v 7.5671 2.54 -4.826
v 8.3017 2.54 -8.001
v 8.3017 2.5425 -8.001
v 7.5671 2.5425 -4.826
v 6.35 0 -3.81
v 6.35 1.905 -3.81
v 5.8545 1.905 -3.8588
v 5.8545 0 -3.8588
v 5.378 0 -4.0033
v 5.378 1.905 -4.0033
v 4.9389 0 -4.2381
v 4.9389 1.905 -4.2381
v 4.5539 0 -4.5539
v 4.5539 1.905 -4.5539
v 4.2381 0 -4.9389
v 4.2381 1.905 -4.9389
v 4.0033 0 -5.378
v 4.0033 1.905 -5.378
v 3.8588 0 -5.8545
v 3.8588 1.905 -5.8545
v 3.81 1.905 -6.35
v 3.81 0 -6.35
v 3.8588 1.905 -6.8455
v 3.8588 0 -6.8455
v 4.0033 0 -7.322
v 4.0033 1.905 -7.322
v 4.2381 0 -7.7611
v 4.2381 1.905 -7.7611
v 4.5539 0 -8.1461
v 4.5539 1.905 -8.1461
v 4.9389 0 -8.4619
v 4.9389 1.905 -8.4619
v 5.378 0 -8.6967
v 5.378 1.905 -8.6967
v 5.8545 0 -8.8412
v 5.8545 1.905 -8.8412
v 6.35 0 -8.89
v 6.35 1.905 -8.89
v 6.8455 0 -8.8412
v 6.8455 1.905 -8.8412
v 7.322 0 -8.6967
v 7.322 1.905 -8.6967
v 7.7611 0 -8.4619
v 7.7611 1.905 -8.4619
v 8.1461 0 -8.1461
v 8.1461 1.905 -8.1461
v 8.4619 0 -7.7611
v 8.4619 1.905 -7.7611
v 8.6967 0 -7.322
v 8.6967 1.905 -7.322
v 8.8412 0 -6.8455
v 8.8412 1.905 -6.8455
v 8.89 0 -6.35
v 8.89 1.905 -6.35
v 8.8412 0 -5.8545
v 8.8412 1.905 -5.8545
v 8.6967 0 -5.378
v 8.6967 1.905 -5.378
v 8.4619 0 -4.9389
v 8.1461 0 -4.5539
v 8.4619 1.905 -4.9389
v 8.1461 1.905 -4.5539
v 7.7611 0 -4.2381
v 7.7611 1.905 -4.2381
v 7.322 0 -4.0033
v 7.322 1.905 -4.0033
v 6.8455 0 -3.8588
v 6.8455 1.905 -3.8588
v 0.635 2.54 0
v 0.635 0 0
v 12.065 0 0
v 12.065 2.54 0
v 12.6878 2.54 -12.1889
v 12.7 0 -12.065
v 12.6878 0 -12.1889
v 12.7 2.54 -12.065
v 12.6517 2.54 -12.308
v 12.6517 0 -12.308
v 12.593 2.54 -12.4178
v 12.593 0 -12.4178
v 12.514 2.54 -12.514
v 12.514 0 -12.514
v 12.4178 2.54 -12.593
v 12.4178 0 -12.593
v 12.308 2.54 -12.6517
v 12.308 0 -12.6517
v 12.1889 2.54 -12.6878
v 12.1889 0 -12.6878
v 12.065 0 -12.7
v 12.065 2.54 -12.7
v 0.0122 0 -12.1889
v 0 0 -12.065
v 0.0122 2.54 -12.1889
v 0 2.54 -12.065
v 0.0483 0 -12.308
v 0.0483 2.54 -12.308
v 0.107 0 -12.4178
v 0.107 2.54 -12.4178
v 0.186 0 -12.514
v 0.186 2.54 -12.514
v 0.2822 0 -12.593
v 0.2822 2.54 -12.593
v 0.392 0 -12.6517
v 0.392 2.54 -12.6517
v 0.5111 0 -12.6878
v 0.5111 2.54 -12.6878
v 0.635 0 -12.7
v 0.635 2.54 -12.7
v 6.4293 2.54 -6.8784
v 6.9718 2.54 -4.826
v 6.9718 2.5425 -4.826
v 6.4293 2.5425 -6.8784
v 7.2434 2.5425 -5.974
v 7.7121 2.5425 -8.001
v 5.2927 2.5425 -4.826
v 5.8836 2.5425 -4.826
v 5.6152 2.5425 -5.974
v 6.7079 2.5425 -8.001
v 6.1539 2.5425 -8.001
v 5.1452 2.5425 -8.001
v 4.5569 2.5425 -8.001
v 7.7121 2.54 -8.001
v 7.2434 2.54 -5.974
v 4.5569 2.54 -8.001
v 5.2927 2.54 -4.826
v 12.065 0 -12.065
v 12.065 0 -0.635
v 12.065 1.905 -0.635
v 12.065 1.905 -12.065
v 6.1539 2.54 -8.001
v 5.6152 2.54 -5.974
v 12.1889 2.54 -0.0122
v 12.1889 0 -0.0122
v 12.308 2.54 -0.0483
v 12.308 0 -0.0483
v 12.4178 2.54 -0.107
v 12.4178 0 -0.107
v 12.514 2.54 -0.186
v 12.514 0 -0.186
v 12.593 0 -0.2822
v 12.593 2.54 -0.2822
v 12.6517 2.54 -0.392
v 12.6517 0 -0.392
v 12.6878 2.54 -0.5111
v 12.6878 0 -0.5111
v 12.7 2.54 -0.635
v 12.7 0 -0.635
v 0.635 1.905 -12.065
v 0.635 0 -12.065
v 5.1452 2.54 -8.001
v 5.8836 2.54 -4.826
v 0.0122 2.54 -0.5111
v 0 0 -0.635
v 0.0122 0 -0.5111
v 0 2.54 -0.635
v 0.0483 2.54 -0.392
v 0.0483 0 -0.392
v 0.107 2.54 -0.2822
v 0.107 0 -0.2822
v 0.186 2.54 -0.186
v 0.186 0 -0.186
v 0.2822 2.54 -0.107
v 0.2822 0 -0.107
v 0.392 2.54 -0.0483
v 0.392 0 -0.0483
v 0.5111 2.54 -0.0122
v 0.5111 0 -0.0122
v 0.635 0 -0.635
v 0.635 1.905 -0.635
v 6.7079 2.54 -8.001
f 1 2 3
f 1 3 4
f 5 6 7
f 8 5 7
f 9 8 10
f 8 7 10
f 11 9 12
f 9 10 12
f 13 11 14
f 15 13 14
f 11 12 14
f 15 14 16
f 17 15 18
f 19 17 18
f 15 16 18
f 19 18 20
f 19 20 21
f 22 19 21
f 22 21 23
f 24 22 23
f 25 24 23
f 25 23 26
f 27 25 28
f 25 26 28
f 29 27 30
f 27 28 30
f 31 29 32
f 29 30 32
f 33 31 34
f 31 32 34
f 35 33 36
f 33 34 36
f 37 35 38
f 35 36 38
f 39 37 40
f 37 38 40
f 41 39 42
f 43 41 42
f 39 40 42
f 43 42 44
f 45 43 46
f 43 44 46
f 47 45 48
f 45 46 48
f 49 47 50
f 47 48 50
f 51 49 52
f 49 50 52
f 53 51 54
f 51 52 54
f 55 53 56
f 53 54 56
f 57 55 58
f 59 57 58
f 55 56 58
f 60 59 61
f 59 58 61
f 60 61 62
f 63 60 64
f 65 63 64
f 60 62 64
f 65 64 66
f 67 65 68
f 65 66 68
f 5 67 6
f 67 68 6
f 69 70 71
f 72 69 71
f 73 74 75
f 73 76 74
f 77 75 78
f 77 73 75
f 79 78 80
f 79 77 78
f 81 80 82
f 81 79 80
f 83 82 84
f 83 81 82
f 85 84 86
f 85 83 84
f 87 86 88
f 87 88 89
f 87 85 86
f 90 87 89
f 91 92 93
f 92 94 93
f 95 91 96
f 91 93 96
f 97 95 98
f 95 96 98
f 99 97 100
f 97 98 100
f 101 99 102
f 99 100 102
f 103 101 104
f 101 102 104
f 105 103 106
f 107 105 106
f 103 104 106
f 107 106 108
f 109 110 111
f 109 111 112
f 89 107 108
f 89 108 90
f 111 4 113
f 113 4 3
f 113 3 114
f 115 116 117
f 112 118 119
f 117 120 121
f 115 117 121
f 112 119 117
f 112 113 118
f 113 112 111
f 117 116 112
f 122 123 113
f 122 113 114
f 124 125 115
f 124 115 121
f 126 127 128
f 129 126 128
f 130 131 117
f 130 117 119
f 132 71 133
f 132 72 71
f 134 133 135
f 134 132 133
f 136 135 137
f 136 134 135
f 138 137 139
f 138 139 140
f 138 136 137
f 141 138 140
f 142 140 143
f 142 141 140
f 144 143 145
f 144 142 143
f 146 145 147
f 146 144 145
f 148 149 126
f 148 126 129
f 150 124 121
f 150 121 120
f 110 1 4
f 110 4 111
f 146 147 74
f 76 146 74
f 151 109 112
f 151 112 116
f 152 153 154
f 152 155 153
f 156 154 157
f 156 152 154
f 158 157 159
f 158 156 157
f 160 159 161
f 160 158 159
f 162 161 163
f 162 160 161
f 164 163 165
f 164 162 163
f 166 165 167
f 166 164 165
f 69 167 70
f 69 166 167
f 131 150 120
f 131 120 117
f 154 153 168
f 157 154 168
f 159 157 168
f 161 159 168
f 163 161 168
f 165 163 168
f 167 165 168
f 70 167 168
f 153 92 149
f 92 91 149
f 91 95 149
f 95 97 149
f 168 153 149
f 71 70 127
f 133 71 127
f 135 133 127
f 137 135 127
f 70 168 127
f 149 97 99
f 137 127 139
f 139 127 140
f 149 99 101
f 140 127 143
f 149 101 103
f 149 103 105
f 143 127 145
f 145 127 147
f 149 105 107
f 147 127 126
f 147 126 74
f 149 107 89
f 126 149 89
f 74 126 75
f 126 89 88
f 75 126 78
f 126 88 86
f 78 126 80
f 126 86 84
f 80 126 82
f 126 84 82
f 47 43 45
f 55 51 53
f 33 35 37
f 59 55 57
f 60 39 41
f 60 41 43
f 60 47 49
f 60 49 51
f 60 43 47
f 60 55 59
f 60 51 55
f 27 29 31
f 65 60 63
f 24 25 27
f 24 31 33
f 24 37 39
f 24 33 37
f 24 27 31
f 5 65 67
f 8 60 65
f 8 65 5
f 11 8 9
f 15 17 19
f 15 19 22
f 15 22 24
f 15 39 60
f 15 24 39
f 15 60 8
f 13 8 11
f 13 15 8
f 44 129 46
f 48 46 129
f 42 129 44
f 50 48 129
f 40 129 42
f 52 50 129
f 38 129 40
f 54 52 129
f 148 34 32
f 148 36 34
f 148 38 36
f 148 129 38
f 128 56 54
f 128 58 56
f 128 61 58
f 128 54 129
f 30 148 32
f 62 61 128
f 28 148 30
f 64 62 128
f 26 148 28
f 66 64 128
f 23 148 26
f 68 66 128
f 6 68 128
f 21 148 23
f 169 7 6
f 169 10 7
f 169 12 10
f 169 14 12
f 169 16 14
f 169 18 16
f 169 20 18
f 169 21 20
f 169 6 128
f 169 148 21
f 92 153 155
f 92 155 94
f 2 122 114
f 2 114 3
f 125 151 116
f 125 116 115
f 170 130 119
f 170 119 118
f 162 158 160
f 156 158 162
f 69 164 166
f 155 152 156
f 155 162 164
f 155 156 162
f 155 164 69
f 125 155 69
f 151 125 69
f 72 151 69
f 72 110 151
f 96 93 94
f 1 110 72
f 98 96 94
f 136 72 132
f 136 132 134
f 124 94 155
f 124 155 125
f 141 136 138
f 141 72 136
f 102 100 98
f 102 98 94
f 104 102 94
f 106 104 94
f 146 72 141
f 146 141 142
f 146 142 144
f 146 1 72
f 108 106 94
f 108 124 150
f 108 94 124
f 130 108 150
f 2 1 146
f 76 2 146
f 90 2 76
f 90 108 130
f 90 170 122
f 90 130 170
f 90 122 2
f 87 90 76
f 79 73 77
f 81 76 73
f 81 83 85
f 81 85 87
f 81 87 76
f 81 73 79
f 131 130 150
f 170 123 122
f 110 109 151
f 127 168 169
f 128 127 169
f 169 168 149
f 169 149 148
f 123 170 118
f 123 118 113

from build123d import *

# Parameters (mm, degrees)
SKETCH1_W           = 12.7
SKETCH1_H           = 12.7
BOSS_EXTRUDE1_DEPTH = 2.54
FILLET1_R           = 0.635
SHELL1_START        = 0.635
SHELL1_OUTLINE_W    = 1.905
SHELL1_OUTLINE_H    = 11.43
SHELL1_DEPTH        = 11.43
SKETCH2_R           = 2.54
BOSS_EXTRUDE2_DEPTH = 1.905
BOSS_EXTRUDE3_DEPTH = 0.00254


# Read off the part's stored shape, not the designer's step: Shell1
with BuildPart() as part:
    # Sketch1 → Boss-Extrude1 (new body)
    with BuildSketch(Plane(origin=(0, 0, 0), x_dir=(1, 0, 0), z_dir=(0, 1, 0))):
        with Locations((6.35, 6.35)):
            Rectangle(SKETCH1_W, SKETCH1_H)
    extrude(amount=BOSS_EXTRUDE1_DEPTH)

    # Fillet1
    fillet1_edges = [part.edges().sort_by_distance(p)[0] for p in [
        (0, 1.27, -12.7),
        (12.7, 1.27, -12.7),
        (12.7, 1.27, 0),
        (0, 1.27, 0),
    ]]
    fillet(fillet1_edges, radius=FILLET1_R)

    # Shell1 outline → Shell1 (cut)
    with BuildSketch(Plane.YZ.offset(SHELL1_START)):
        with Locations((0.9525, -6.35)):
            Rectangle(SHELL1_OUTLINE_W, SHELL1_OUTLINE_H)
    extrude(amount=SHELL1_DEPTH, mode=Mode.SUBTRACT)

    # Sketch2 → Boss-Extrude2 (add)
    with BuildSketch(Plane(origin=(0, 1.905, 0), x_dir=(-1, 0, 0), z_dir=(0, -1, 0))):
        with Locations(Location((-6.35, 6.35, 0), (0, 0, 270))):
            Circle(SKETCH2_R)
    extrude(amount=BOSS_EXTRUDE2_DEPTH)

    # Sketch3 → Boss-Extrude3 (add)
    with BuildSketch(Plane(origin=(0, 2.54, 0), x_dir=(1, 0, 0), z_dir=(0, 1, 0))):
        Polygon((4.556857692, 8.001), (5.145173998, 8.001), (5.615191026, 5.974011819), (6.153897957, 8.001), (6.707869311, 8.001), (7.243396154, 5.974011819), (7.712141146, 8.001), (8.301729487, 8.001), (7.567129127, 4.826), (6.971816627, 4.826), (6.42929359, 6.878428886), (5.883590465, 4.826), (5.292730088, 4.826), align=None)
    extrude(amount=BOSS_EXTRUDE3_DEPTH)


solid = part.part
